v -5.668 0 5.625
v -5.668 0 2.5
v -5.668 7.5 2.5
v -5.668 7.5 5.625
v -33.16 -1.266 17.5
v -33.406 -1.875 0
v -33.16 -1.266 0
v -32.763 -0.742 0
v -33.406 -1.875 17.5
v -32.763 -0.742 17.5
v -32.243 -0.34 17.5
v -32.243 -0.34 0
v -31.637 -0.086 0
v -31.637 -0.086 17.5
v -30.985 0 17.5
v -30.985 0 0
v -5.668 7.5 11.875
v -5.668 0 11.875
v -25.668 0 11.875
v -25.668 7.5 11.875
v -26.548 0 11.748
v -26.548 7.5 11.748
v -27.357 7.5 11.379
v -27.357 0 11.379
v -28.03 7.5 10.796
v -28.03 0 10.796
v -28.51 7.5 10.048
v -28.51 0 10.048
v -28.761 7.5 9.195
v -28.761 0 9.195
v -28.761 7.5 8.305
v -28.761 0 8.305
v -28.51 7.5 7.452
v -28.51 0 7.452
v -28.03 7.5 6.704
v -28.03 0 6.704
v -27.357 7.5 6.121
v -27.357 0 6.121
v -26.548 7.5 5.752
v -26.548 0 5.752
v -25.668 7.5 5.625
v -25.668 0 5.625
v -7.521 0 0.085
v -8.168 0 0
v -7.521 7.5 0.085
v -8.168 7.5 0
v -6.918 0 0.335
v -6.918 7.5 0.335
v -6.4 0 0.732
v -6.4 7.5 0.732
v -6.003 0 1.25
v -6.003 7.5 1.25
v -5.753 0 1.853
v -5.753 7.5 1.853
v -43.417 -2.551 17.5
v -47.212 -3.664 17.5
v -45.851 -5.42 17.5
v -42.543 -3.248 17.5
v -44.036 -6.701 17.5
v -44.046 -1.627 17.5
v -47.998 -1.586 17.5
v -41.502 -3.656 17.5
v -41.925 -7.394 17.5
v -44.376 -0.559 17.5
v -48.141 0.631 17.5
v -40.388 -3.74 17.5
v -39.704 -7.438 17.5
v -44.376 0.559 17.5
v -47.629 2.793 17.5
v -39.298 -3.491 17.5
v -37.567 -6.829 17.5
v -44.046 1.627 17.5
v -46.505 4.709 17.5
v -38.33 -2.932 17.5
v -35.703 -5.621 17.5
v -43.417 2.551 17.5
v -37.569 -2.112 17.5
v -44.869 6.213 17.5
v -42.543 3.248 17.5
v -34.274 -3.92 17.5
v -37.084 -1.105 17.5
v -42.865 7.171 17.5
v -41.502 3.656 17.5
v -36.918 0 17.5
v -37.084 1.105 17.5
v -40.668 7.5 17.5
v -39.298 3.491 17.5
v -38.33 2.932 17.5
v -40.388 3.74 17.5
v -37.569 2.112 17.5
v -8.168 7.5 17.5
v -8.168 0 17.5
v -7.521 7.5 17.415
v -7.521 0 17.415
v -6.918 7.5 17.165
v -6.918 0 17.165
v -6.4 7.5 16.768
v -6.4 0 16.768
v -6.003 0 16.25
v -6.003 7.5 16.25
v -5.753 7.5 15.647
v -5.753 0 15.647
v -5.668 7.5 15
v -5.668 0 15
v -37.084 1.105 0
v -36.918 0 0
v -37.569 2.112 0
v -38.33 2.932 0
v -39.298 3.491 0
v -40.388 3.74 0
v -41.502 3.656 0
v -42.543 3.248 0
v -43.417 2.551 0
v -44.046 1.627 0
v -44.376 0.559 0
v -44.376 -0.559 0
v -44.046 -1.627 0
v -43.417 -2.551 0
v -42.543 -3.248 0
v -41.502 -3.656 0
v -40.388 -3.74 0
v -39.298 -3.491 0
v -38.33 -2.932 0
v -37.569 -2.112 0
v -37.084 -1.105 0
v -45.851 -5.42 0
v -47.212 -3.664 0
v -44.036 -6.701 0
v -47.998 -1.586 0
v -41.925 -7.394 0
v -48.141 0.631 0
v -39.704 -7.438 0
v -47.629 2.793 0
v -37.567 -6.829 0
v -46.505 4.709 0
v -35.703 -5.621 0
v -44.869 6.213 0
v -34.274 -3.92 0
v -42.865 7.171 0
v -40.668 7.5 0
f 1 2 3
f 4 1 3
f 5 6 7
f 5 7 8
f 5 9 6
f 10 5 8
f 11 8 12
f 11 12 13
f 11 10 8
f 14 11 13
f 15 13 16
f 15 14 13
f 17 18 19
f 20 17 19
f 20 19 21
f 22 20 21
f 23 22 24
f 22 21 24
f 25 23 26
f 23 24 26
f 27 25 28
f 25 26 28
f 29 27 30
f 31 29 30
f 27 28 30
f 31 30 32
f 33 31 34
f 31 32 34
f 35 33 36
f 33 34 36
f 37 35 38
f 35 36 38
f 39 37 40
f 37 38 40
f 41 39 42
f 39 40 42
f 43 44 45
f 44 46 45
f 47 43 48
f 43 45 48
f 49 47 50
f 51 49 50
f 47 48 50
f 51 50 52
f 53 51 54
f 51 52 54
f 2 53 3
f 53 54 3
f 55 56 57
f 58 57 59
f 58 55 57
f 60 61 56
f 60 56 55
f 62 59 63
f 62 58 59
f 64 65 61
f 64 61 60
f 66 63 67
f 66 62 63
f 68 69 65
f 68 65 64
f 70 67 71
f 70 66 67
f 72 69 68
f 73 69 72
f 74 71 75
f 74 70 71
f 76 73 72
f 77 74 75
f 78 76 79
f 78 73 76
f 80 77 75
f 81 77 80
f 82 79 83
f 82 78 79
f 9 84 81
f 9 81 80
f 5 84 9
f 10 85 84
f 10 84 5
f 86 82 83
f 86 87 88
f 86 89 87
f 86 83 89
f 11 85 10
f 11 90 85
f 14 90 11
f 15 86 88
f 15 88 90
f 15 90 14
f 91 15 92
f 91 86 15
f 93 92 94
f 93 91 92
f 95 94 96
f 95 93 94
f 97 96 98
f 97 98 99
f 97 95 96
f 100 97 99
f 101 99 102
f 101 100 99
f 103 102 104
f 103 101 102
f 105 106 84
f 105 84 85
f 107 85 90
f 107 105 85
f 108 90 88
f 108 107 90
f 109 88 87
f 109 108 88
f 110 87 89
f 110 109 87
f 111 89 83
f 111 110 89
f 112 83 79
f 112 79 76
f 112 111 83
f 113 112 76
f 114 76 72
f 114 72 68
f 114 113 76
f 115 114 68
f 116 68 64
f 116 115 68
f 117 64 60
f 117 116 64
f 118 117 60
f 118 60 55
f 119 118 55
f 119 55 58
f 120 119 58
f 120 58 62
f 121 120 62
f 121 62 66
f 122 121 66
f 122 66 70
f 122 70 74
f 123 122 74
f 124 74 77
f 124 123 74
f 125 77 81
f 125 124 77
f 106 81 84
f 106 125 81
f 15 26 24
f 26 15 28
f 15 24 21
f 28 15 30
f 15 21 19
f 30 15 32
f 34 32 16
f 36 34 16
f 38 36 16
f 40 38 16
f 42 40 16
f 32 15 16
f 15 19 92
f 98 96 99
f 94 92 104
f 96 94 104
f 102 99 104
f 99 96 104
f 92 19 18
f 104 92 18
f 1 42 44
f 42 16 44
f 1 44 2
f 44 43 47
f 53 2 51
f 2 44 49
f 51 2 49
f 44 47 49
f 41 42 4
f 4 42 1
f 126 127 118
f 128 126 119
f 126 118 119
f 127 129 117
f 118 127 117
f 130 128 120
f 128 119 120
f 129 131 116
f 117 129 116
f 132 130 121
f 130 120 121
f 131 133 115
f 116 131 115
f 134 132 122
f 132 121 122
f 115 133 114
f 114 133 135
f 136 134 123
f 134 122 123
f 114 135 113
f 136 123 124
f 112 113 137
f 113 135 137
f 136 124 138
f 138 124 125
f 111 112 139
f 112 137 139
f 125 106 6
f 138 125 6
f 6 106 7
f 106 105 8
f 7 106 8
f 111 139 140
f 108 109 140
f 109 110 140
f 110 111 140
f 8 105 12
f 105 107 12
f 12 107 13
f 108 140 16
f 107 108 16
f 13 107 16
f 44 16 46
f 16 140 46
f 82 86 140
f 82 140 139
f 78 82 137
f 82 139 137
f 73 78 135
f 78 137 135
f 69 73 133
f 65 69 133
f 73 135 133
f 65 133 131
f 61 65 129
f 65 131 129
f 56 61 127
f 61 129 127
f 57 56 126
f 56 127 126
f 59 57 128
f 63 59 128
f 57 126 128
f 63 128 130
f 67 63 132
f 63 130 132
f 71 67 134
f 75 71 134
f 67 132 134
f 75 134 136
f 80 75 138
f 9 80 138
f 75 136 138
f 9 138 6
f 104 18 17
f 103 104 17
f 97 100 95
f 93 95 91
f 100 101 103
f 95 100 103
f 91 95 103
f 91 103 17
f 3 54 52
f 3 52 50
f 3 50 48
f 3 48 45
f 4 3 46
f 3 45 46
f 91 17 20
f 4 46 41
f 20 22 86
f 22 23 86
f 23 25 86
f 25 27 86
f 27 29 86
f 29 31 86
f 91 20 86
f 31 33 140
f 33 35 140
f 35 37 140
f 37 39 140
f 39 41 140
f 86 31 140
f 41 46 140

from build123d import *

# Parameters (mm, degrees)
F0_R     = 3.75
F1_DEPTH = 17.5
F3_DEPTH = 25
F4_R     = 2.5


with BuildPart() as f1:
    # F0 (on Top) → F1 (new body)
    with BuildSketch(Plane.XY):
        with BuildLine():
            ThreePointArc((-40.66784, 7.5), (-45.971141, -5.303301), (-33.16784, 0))
            ThreePointArc((-33.16784, 0), (-35.364539, 5.303301), (-40.66784, 7.5))
        make_face()
        with Locations((-40.66784, 0)):
            Circle(F0_R, mode=Mode.SUBTRACT)
        with BuildLine():
            ThreePointArc((-40.66784, 7.5), (-35.364539, 5.303301), (-33.16784, 0))
            Line((-33.16784, 0), (-5.66784, 0))
            Line((-5.66784, 0), (-5.66784, 7.5))
            Line((-5.66784, 7.5), (-40.66784, 7.5))
        make_face()
    extrude(amount=F1_DEPTH)

    # F2 (on face) → F3 (cut)
    with BuildSketch(Plane.XZ):
        with BuildLine():
            Line((-5.66784, 5.625), (-5.66784, 11.875))
            Line((-5.66784, 11.875), (-25.66784, 11.875))
            ThreePointArc((-25.66784, 11.875), (-28.79284, 8.75), (-25.66784, 5.625))
            Line((-25.66784, 5.625), (-5.66784, 5.625))
        make_face()
    extrude(amount=-F3_DEPTH, mode=Mode.SUBTRACT)

    # F4
    f4_edges = [f1.edges().sort_by_distance(p)[0] for p in [
        (-5.66784, 3.75, 17.5),
        (-5.66784, 3.75, 0),
        (-33.16784, 0, 8.75),
    ]]
    fillet(f4_edges, radius=F4_R)


solid = f1.part
